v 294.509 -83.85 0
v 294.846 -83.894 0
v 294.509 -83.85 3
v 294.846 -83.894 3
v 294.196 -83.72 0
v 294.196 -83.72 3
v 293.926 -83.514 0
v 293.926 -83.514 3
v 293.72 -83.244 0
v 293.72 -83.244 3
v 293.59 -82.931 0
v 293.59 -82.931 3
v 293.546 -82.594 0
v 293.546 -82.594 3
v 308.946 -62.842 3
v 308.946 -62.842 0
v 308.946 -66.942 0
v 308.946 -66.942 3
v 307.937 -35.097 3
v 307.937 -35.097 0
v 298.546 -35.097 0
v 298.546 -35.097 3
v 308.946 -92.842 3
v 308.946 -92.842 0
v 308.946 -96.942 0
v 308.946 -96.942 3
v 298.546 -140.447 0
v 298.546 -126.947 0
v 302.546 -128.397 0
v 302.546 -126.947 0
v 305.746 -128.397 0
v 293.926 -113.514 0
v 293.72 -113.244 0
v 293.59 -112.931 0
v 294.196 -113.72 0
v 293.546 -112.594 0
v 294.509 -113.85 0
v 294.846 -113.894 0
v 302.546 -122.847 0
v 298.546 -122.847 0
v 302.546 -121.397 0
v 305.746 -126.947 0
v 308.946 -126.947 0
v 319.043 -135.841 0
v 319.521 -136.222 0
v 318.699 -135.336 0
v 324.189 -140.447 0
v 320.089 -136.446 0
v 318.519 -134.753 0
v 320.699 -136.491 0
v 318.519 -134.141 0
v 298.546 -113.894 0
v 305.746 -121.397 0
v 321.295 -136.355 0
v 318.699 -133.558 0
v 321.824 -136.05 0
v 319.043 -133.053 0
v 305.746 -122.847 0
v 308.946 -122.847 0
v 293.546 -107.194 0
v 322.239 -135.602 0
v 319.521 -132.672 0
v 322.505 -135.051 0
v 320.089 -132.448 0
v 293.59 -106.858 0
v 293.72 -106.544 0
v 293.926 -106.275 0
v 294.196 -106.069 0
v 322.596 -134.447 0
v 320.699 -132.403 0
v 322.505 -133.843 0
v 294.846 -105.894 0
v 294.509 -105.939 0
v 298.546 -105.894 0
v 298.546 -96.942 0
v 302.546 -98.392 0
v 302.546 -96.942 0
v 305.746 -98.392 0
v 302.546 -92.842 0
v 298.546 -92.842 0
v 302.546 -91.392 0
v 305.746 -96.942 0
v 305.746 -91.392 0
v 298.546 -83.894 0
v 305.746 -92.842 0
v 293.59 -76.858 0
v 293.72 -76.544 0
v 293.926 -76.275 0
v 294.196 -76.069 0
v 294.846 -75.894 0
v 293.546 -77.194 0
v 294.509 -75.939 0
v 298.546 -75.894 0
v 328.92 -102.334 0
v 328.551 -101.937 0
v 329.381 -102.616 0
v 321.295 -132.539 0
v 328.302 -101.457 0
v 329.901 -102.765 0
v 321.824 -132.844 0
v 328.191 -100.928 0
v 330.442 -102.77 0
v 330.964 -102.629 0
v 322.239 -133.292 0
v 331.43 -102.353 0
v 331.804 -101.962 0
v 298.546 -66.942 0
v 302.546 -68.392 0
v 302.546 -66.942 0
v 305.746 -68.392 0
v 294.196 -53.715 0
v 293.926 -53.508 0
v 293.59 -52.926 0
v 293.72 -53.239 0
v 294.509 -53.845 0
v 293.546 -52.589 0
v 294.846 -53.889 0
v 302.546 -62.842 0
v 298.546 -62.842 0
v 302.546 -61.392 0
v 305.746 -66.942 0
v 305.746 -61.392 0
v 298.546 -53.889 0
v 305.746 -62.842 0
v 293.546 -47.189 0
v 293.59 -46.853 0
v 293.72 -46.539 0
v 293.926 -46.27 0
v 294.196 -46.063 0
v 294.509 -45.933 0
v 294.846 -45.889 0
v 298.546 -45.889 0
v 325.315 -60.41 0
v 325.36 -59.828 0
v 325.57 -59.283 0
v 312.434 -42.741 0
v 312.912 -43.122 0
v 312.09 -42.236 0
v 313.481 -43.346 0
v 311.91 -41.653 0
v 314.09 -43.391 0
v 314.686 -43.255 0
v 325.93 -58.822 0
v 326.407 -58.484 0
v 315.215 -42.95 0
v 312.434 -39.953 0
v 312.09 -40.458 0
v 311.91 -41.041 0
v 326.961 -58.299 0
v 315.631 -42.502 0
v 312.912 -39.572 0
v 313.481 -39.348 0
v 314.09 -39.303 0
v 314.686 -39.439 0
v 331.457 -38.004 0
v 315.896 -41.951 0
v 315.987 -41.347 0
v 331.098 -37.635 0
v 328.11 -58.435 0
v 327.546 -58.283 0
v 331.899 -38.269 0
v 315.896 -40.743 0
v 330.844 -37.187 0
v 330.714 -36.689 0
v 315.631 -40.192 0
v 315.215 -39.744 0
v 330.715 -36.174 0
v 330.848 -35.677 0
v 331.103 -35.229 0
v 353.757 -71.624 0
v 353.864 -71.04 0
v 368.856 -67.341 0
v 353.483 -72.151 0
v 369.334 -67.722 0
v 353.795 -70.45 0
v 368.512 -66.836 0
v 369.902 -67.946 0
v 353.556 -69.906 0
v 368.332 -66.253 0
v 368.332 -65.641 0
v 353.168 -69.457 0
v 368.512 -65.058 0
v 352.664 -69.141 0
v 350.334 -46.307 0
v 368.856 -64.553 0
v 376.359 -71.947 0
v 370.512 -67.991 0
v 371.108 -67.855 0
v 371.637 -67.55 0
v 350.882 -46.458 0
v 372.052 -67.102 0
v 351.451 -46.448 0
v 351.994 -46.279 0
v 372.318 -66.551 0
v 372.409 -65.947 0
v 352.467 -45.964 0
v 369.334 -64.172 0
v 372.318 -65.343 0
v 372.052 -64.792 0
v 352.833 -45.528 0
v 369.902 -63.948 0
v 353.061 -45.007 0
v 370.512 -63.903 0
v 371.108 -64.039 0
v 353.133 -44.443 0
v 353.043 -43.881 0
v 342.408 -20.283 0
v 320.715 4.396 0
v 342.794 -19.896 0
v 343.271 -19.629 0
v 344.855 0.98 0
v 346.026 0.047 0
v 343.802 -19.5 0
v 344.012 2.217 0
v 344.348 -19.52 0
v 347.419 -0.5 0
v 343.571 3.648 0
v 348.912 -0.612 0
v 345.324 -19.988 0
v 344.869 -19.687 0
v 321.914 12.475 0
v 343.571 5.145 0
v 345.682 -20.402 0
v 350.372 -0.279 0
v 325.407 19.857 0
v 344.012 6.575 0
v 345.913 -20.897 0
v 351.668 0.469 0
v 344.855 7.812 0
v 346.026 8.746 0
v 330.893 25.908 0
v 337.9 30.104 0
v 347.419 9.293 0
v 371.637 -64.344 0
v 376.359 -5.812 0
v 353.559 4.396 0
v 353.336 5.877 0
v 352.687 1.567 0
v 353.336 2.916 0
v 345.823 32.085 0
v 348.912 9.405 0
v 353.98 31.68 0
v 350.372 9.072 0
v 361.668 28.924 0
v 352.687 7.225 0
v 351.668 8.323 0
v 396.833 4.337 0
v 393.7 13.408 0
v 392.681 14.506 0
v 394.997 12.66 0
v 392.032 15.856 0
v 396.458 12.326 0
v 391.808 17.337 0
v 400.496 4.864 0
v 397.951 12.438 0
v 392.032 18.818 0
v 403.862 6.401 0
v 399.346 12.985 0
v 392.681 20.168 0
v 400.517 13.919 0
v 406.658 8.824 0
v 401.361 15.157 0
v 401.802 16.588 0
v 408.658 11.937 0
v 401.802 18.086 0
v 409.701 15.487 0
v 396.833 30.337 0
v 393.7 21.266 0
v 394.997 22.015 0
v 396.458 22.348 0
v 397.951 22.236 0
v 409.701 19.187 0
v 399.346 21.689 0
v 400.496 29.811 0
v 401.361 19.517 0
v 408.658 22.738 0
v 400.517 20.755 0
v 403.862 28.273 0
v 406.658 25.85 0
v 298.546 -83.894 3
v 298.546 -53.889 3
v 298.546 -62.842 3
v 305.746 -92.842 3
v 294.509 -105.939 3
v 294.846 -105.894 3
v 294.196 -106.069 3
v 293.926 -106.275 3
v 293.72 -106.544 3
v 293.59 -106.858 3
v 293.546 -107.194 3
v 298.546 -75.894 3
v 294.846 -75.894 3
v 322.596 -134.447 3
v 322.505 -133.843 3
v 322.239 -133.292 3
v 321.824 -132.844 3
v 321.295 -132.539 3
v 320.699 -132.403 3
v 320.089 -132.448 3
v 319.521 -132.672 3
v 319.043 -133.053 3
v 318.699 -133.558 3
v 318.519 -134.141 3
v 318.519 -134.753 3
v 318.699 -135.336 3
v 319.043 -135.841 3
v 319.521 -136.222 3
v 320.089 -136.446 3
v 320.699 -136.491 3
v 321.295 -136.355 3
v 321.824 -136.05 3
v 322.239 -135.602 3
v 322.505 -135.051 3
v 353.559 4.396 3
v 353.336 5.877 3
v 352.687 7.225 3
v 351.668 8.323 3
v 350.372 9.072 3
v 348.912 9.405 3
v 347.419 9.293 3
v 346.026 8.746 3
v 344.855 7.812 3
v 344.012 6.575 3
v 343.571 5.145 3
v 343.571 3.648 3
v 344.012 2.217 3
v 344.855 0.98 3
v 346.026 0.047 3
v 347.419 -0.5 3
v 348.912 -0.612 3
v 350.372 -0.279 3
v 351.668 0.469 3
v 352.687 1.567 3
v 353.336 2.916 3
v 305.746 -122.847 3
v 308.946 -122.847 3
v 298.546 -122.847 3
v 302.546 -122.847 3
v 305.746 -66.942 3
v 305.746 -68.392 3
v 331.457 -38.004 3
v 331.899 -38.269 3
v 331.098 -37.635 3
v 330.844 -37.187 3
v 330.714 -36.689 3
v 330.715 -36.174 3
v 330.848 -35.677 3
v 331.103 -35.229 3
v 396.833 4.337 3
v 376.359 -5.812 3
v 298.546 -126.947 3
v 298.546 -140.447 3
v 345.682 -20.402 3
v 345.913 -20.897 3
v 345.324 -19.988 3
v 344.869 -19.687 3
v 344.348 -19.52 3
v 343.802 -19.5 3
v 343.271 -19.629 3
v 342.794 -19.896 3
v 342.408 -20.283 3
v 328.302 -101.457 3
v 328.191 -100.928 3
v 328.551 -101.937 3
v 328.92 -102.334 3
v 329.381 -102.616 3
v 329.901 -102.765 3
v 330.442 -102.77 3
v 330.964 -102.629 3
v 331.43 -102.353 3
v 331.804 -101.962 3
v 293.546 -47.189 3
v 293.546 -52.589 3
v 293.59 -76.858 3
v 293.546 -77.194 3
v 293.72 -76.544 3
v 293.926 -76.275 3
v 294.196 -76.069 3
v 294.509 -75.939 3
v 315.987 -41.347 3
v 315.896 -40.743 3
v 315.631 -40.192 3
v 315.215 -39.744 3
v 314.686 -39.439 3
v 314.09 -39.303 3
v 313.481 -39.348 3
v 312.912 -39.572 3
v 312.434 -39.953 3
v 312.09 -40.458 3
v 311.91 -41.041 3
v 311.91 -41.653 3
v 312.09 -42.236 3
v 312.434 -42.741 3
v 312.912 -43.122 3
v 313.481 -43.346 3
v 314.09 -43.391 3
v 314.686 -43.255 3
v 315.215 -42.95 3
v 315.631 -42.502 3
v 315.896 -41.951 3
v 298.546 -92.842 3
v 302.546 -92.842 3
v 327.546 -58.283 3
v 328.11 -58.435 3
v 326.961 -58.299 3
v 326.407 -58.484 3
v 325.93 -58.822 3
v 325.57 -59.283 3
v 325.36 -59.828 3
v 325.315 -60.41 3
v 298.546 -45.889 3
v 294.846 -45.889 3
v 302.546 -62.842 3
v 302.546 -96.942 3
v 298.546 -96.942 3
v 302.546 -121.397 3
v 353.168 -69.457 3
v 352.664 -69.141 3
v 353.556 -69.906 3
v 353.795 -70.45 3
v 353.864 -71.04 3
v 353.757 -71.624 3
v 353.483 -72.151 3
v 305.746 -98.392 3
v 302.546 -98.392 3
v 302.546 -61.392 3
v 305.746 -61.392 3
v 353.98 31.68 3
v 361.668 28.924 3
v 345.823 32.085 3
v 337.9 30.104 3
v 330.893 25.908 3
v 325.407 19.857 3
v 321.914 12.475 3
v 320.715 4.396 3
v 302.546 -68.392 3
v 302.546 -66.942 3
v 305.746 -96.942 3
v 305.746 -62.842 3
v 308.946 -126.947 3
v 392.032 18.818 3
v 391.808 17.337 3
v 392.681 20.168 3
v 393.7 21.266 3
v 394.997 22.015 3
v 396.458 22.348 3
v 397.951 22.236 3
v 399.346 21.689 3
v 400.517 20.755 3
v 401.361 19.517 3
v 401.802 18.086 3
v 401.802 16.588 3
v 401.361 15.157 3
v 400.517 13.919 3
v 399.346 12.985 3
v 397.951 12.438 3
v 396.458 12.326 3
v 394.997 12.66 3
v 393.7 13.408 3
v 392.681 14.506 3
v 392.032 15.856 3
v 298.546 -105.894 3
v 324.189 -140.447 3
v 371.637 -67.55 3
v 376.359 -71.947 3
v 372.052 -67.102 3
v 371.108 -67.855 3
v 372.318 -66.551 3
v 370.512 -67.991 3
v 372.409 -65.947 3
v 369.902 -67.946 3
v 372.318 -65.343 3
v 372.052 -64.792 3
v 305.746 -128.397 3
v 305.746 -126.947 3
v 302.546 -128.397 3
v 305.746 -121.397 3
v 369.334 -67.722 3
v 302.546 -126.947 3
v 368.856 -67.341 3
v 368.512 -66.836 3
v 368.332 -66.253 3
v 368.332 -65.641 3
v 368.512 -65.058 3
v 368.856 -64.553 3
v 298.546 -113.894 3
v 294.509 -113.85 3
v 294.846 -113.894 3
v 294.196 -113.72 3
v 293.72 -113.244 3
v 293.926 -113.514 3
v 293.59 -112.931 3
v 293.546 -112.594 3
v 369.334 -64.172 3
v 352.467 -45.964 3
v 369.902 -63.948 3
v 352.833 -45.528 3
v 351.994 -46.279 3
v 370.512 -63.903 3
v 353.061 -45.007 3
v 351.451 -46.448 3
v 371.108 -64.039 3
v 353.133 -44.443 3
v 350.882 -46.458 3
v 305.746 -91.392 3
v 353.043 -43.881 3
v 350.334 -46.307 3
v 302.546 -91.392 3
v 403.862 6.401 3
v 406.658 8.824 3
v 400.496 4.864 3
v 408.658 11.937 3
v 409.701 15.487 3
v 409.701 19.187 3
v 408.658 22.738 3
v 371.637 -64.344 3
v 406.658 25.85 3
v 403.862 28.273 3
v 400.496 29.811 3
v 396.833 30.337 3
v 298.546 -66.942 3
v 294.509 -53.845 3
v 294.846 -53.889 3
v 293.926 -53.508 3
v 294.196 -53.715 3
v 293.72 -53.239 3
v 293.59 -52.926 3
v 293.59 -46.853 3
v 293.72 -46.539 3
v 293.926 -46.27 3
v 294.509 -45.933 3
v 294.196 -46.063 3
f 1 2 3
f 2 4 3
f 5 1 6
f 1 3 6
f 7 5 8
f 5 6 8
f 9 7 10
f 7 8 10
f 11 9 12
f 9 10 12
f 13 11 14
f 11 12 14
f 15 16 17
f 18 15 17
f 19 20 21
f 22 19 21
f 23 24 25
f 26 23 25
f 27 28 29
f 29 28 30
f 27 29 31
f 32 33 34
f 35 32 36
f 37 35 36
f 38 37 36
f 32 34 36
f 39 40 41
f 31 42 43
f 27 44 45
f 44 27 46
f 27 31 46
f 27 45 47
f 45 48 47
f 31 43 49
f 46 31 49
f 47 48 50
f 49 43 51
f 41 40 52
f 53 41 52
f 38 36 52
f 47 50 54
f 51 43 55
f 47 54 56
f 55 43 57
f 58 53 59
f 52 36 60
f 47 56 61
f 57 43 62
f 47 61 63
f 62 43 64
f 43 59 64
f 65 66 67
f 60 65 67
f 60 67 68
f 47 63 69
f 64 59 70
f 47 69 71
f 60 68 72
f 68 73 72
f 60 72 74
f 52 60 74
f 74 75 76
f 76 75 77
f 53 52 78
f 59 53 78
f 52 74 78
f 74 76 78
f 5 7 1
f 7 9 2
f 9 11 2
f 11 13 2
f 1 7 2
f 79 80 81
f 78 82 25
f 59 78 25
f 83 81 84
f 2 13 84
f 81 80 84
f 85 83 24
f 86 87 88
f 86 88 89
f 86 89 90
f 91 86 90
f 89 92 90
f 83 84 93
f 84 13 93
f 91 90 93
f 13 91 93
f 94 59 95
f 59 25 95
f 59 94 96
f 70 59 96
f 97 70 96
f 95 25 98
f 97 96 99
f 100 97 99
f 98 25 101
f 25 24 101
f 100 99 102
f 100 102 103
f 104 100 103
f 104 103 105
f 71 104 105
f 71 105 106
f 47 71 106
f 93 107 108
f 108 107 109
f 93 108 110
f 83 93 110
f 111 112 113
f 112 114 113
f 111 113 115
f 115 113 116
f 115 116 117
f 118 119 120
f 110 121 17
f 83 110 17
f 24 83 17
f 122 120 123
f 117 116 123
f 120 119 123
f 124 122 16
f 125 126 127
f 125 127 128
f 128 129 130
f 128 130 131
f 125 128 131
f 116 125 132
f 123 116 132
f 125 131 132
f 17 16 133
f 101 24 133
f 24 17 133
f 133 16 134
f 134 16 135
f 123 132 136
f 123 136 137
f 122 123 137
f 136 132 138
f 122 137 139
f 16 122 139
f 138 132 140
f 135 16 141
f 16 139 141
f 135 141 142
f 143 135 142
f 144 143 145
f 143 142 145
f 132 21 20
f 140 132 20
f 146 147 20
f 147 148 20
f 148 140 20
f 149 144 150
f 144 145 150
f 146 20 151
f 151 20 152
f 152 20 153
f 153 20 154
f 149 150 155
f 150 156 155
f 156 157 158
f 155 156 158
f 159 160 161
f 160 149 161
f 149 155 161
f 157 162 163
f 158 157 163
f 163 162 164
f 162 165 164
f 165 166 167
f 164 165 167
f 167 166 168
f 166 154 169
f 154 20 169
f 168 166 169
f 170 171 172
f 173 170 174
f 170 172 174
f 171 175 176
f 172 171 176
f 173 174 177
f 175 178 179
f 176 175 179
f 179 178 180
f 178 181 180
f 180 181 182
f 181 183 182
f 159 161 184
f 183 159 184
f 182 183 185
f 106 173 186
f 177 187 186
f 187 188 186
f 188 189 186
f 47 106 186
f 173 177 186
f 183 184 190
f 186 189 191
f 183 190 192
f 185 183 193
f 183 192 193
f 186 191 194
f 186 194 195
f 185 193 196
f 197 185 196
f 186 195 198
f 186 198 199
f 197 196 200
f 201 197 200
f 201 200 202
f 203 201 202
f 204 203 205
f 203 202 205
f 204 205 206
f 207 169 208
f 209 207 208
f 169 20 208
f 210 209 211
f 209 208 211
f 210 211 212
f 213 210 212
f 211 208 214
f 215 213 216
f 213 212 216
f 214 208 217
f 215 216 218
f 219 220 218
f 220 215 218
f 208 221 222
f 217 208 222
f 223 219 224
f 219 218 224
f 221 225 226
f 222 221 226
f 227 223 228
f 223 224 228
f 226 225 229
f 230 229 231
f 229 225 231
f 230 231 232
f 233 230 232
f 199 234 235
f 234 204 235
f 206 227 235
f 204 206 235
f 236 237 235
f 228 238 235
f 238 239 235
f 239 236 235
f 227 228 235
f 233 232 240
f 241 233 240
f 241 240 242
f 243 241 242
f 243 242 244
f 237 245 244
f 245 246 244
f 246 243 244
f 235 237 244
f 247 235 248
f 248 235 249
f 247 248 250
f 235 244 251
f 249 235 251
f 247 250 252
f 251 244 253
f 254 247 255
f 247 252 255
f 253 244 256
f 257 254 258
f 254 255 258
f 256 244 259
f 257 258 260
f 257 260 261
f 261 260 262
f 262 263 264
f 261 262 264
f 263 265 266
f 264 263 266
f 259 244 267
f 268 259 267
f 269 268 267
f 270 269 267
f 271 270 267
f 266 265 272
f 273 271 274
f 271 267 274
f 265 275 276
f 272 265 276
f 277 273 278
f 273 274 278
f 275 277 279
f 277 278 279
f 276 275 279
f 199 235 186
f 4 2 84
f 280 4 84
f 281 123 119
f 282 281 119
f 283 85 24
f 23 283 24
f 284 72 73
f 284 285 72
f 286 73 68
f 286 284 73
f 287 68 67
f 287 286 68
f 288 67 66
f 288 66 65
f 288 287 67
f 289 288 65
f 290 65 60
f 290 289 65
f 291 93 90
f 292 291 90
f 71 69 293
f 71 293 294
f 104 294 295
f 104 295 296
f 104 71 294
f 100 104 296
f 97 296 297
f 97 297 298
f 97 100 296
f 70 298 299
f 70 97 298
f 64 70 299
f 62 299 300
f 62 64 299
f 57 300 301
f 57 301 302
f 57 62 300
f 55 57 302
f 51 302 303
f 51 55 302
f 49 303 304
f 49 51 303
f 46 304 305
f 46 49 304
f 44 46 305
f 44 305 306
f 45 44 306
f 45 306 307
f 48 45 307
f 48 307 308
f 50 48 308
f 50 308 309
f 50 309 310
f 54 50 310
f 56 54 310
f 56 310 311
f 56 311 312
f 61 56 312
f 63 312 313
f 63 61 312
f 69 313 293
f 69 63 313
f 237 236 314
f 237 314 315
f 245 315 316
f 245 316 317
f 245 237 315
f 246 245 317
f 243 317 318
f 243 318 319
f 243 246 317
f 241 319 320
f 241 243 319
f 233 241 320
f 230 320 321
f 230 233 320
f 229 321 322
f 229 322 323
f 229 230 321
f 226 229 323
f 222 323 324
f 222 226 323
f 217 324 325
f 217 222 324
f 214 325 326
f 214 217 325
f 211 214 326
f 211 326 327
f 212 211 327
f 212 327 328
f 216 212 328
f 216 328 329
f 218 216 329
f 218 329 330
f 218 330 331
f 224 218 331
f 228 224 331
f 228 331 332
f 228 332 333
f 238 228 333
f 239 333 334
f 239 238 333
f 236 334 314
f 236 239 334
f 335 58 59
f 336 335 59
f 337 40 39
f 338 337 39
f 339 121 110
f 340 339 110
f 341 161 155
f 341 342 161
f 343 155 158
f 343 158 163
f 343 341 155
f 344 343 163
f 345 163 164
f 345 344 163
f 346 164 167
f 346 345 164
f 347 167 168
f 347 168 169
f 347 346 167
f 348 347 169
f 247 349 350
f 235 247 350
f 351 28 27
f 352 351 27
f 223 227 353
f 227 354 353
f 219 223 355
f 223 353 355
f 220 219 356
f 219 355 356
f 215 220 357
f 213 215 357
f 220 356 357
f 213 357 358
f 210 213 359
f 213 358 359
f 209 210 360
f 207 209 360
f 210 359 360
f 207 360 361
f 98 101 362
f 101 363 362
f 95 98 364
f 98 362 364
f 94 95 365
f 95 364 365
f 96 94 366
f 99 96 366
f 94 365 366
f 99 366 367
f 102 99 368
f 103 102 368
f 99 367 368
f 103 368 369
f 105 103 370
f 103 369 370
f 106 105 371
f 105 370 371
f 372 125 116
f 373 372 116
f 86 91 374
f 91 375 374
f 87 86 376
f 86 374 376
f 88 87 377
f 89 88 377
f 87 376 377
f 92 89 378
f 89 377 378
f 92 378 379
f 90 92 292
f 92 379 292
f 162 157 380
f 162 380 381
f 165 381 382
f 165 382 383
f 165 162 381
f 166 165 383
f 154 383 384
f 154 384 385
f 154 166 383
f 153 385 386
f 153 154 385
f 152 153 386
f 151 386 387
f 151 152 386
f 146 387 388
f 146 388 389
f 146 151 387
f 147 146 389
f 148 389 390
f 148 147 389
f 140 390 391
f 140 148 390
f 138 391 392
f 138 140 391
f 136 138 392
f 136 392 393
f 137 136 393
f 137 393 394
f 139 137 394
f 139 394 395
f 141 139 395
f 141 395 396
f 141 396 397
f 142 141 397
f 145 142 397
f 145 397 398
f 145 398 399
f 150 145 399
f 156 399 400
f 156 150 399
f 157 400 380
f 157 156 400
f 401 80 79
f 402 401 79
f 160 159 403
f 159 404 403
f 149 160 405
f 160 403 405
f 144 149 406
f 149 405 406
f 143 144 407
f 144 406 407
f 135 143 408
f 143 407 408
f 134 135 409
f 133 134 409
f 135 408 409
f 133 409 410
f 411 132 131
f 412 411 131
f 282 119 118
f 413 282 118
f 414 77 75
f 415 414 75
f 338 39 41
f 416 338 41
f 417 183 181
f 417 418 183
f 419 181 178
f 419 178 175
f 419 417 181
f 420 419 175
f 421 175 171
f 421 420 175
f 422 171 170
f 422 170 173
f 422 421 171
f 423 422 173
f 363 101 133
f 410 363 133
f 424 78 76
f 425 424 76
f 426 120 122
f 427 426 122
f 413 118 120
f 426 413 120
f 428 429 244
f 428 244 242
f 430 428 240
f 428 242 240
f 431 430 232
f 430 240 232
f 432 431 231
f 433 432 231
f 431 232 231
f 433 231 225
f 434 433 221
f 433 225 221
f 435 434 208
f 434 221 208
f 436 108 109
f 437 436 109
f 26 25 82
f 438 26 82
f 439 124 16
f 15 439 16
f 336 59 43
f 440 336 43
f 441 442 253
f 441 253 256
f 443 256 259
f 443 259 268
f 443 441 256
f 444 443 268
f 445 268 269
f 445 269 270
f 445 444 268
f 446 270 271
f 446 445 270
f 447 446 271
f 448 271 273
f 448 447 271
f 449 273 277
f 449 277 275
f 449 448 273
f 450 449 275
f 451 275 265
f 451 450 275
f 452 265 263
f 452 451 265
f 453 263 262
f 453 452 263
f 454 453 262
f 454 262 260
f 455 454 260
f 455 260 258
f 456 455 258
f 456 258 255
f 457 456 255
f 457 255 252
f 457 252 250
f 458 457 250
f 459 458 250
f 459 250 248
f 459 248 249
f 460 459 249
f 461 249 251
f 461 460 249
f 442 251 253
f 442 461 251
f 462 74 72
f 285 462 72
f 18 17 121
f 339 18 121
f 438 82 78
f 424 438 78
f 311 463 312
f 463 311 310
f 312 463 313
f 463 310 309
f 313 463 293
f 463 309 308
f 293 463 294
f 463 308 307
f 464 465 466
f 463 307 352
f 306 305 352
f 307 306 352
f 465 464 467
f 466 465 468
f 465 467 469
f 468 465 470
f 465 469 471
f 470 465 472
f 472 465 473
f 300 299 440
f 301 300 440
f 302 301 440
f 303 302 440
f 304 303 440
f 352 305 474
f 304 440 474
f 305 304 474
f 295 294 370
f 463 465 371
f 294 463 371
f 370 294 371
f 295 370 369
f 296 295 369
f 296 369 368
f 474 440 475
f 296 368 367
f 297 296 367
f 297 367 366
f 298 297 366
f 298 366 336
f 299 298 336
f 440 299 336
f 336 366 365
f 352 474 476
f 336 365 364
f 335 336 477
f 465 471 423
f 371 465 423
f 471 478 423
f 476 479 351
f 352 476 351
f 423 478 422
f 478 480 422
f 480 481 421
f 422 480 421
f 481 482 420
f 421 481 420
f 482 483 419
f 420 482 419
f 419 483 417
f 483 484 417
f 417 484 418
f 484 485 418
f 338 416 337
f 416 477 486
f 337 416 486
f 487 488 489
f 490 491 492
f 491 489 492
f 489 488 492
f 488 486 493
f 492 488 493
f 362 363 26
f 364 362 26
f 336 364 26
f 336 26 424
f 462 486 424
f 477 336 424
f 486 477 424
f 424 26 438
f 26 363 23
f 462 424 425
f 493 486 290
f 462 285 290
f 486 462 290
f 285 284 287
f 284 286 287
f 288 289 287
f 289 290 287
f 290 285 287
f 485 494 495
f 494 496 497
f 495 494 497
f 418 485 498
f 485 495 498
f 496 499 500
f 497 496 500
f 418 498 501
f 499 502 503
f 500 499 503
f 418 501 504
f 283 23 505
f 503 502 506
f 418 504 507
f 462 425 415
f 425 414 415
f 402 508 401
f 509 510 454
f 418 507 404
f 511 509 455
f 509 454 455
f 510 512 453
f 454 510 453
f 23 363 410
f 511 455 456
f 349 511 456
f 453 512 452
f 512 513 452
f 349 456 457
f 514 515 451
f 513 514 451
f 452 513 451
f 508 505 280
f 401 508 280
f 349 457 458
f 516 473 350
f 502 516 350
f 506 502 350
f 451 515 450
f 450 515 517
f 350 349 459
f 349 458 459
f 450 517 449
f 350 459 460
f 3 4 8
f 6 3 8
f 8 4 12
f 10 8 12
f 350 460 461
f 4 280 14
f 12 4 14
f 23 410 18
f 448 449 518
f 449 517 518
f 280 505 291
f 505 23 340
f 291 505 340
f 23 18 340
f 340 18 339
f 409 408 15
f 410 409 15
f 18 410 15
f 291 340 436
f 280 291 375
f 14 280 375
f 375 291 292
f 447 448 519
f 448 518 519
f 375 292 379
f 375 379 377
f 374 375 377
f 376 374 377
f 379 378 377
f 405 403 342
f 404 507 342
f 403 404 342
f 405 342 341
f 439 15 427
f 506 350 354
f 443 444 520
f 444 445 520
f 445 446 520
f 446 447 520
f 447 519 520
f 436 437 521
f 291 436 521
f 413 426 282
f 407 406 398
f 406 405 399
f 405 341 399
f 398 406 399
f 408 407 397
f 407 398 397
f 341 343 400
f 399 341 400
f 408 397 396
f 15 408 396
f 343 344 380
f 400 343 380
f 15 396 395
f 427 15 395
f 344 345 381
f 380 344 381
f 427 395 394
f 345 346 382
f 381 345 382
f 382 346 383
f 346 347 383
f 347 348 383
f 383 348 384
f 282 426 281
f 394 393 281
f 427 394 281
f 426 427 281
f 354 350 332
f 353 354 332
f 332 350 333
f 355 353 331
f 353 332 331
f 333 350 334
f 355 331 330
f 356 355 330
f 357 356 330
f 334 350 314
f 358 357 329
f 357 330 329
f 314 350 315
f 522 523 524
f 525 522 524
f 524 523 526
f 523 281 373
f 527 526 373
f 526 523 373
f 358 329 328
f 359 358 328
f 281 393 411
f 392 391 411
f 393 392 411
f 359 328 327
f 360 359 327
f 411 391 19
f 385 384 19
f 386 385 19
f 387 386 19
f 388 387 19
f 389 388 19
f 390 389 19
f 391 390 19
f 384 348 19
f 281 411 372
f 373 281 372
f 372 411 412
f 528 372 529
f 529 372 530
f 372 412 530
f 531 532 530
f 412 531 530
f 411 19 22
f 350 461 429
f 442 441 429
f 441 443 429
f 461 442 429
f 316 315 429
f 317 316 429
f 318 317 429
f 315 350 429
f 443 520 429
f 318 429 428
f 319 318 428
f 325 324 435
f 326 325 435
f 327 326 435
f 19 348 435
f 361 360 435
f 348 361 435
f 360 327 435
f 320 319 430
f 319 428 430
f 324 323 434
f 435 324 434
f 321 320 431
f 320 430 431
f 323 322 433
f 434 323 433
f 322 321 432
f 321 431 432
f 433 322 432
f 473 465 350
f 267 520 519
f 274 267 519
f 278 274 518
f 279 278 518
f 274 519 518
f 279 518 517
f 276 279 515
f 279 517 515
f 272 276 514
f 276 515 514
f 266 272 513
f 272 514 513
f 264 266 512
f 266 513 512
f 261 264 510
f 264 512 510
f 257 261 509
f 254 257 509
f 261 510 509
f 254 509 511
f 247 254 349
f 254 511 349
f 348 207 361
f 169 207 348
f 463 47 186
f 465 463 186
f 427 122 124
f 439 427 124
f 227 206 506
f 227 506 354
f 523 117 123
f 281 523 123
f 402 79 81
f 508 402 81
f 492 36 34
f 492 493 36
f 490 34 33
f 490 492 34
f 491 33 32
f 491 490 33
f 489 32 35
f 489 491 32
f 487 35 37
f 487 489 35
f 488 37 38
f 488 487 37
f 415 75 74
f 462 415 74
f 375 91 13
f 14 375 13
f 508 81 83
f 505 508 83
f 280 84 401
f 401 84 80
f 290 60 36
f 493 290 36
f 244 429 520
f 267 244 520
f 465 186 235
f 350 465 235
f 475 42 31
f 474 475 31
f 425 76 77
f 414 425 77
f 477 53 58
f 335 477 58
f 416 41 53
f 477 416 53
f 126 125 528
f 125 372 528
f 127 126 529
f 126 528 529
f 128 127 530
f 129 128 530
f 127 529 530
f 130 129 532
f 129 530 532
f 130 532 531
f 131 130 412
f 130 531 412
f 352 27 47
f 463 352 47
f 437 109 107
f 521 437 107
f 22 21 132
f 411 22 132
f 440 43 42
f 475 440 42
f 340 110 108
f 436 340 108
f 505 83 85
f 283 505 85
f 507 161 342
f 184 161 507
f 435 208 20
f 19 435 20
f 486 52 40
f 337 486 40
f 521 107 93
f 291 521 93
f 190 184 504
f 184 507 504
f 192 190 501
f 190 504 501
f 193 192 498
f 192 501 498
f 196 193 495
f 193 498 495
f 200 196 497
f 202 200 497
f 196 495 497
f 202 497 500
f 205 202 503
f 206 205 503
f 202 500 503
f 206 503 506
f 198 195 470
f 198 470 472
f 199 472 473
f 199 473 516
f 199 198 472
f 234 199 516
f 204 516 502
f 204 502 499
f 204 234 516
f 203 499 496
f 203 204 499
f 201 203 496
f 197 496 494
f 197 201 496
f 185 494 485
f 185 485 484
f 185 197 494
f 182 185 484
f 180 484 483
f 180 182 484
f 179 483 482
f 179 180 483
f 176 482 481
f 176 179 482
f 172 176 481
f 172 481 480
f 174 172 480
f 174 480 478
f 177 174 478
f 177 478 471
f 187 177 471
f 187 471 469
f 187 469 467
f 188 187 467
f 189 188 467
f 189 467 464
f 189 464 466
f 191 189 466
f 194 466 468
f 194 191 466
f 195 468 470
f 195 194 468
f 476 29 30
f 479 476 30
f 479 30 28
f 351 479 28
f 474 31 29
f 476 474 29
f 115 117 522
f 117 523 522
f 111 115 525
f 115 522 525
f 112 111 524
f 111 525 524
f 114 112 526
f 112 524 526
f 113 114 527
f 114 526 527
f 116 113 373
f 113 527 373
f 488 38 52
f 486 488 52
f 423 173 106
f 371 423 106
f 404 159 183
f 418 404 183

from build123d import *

# Parameters (mm, degrees)
SKETCH_1_R      = 5.0225
SKETCH_1_R_2    = 2.05
EXTRUDE_1_DEPTH = 3
FILLET_1_R      = 2
FILLET_2_R      = 1.3
EXTRUDE_START   = -3
SKETCH_3_R      = 5.025
EXTRUDE_2_DEPTH = 3


with BuildPart() as part:
    # 草图1 → 凸台-拉伸1 (new body)
    with BuildSketch(Plane.XY):
        with BuildLine():
            Line((298.545628784, -83.894391363), (298.545628784, -92.841778663))
            Line((298.545628784, -92.841778663), (302.545628784, -92.841778663))
            Line((302.545628784, -92.841778663), (302.545628784, -91.391778663))
            Line((302.545628784, -91.391778663), (305.745628784, -91.391778663))
            Line((305.745628784, -91.391778663), (305.745628784, -92.841778663))
            Line((305.745628784, -92.841778663), (308.945628784, -92.841778663))
            Line((308.945628784, -92.841778663), (308.945628784, -96.941778663))
            Line((308.945628784, -96.941778663), (305.745628784, -96.941778663))
            Line((305.745628784, -96.941778663), (305.745628784, -98.391778663))
            Line((305.745628784, -98.391778663), (302.545628784, -98.391778663))
            Line((302.545628784, -98.391778663), (302.545628784, -96.941778663))
            Line((302.545628784, -96.941778663), (298.545628784, -96.941778663))
            Line((298.545628784, -96.941778663), (298.545628784, -105.894391358))
            Line((298.545628784, -105.894391358), (293.545628784, -105.894391358))
            Line((293.545628784, -105.894391358), (293.545628784, -113.894391358))
            Line((293.545628784, -113.894391358), (298.545628784, -113.894391358))
            Line((298.545628784, -113.894391358), (298.545628784, -122.847004054))
            Line((298.545628784, -122.847004054), (302.545628784, -122.847004054))
            Line((302.545628784, -122.847004054), (302.545628784, -121.397004054))
            Line((302.545628784, -121.397004054), (305.745628784, -121.397004054))
            Line((305.745628784, -121.397004054), (305.745628784, -122.847004054))
            Line((305.745628784, -122.847004054), (308.945628784, -122.847004054))
            Line((308.945628784, -122.847004054), (308.945628784, -126.947004054))
            Line((308.945628784, -126.947004054), (305.745628784, -126.947004054))
            Line((305.745628784, -126.947004054), (305.745628784, -128.397004054))
            Line((305.745628784, -128.397004054), (302.545628784, -128.397004054))
            Line((302.545628784, -128.397004054), (302.545628784, -126.947004054))
            Line((302.545628784, -126.947004054), (298.545628784, -126.947004054))
            Line((298.545628784, -126.947004054), (298.545628784, -140.447004054))
            Line((298.545628784, -140.447004054), (324.188862368, -140.447004054))
            Line((324.188862368, -140.447004054), (376.358604426, -71.946984141))
            Line((376.358604426, -71.946984141), (376.358604426, 4.396201153))
            ThreePointArc((376.358604426, 4.396201153), (348.536987634, 32.217817945), (320.715370843, 4.396201153))
            Line((320.715370843, 4.396201153), (307.936987634, -35.096984141))
            Line((307.936987634, -35.096984141), (298.545628784, -35.096984141))
            Line((298.545628784, -35.096984141), (298.545628784, -45.889165972))
            Line((298.545628784, -45.889165972), (293.545628784, -45.889165972))
            Line((293.545628784, -45.889165972), (293.545628784, -53.889165972))
            Line((293.545628784, -53.889165972), (298.545628784, -53.889165972))
            Line((298.545628784, -53.889165972), (298.545628784, -62.841778668))
            Line((298.545628784, -62.841778668), (302.545628784, -62.841778668))
            Line((302.545628784, -62.841778668), (302.545628784, -61.391778668))
            Line((302.545628784, -61.391778668), (305.745628784, -61.391778668))
            Line((305.745628784, -61.391778668), (305.745628784, -62.841778668))
            Line((305.745628784, -62.841778668), (308.945628784, -62.841778668))
            Line((308.945628784, -62.841778668), (308.945628784, -66.941778668))
            Line((308.945628784, -66.941778668), (305.745628784, -66.941778668))
            Line((305.745628784, -66.941778668), (305.745628784, -68.391778668))
            Line((305.745628784, -68.391778668), (302.545628784, -68.391778668))
            Line((302.545628784, -68.391778668), (302.545628784, -66.941778668))
            Line((302.545628784, -66.941778668), (298.545628784, -66.941778668))
            Line((298.545628784, -66.941778668), (298.545628784, -75.894391363))
            Line((298.545628784, -75.894391363), (293.545628784, -75.894391363))
            Line((293.545628784, -75.894391363), (293.545628784, -83.894391363))
            Line((293.545628784, -83.894391363), (298.545628784, -83.894391363))
        make_face()
        with Locations((348.536987634, 4.396201153)):
            Circle(SKETCH_1_R, mode=Mode.SUBTRACT)
        with Locations((320.545628784, -134.447004054)):
            Circle(SKETCH_1_R_2, mode=Mode.SUBTRACT)
        with Locations((370.358604426, -65.946984141)):
            Circle(SKETCH_1_R_2, mode=Mode.SUBTRACT)
        with Locations((313.936987634, -41.346984141)):
            Circle(SKETCH_1_R_2, mode=Mode.SUBTRACT)
        Polygon((354.947285032, -70.136765586), (328.579617375, -106.396108383), (325.08144343, -57.115165973), align=None, mode=Mode.SUBTRACT)
        Polygon((329.571126451, -37.254352656), (354.337315751, -48.052488042), (344.758747766, -17.175445836), align=None, mode=Mode.SUBTRACT)
    extrude(amount=EXTRUDE_1_DEPTH)

    # 圆角1
    fillet_1_edges = [part.edges().sort_by_distance(p)[0] for p in [
        (354.947285032, -70.136765586, 1.5),
        (325.08144343, -57.115165973, 1.5),
        (328.579617375, -106.396108383, 1.5),
        (344.758747766, -17.175445836, 1.5),
        (329.571126451, -37.254352656, 1.5),
        (354.337315751, -48.052488042, 1.5),
    ]]
    fillet(fillet_1_edges, radius=FILLET_1_R)

    # 圆角2
    fillet_2_edges = [part.edges().sort_by_distance(p)[0] for p in [
        (293.545628784, -113.894391358, 1.5),
        (293.545628784, -105.894391358, 1.5),
        (293.545628784, -83.894391363, 1.5),
        (293.545628784, -75.894391363, 1.5),
        (293.545628784, -53.889165972, 1.5),
        (293.545628784, -45.889165972, 1.5),
    ]]
    fillet(fillet_2_edges, radius=FILLET_2_R)

    # 草图3 → 凸台-拉伸2 (add)
    with BuildSketch(Plane(origin=(0, 0, 0), x_dir=(-1, 0, 0), z_dir=(0, 0, -1)).offset(EXTRUDE_START)):
        with BuildLine():
            Line((-348.536987634, 28.396201153), (-396.833278949, 30.337153408))
            ThreePointArc((-396.833278949, 30.337153408), (-409.833278949, 17.337153408), (-396.833278949, 4.337153408))
            Line((-396.833278949, 4.337153408), (-348.536987634, -19.603798847))
            Line((-348.536987634, -19.603798847), (-372.536987634, 4.396201153))
            Line((-372.536987634, 4.396201153), (-348.536987634, 28.396201153))
        make_face()
        with Locations((-396.833278949, 17.337153408)):
            Circle(SKETCH_3_R, mode=Mode.SUBTRACT)
    extrude(amount=EXTRUDE_2_DEPTH)


solid = part.part
